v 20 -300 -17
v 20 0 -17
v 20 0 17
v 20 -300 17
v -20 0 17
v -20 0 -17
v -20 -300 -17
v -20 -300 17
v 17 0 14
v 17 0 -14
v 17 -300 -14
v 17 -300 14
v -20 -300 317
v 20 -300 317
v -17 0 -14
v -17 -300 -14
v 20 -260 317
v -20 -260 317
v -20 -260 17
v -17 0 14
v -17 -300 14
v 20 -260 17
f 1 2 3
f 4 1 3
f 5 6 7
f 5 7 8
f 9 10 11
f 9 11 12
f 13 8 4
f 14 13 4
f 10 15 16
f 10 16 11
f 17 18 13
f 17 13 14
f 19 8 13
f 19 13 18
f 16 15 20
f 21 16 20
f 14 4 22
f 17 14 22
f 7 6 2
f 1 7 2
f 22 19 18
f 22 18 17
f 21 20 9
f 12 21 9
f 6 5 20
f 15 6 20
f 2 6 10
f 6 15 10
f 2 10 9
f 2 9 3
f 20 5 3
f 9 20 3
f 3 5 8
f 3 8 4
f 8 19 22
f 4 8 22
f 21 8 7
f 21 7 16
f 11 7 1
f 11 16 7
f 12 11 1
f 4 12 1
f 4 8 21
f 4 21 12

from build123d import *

# Parameters (mm, degrees)
F0_W     = 40
F0_H     = 34
F0_W_2   = 34
F0_H_2   = 28
F1_DEPTH = 300
F2_W     = 40
F2_H     = 40
F3_DEPTH = 300


with BuildPart() as f1:
    # F0 (on Front) → F1 (new body)
    with BuildSketch(Plane.XZ):
        Rectangle(F0_W, F0_H)
        Rectangle(F0_W_2, F0_H_2, mode=Mode.SUBTRACT)
    extrude(amount=F1_DEPTH)


with BuildPart() as f3:
    # F2 (on face) → F3 (new body)
    with BuildSketch(Plane.XY.offset(17)):
        with Locations((0, -280)):
            Rectangle(F2_W, F2_H)
    extrude(amount=F3_DEPTH)


solid = Compound([f1.part, f3.part])
